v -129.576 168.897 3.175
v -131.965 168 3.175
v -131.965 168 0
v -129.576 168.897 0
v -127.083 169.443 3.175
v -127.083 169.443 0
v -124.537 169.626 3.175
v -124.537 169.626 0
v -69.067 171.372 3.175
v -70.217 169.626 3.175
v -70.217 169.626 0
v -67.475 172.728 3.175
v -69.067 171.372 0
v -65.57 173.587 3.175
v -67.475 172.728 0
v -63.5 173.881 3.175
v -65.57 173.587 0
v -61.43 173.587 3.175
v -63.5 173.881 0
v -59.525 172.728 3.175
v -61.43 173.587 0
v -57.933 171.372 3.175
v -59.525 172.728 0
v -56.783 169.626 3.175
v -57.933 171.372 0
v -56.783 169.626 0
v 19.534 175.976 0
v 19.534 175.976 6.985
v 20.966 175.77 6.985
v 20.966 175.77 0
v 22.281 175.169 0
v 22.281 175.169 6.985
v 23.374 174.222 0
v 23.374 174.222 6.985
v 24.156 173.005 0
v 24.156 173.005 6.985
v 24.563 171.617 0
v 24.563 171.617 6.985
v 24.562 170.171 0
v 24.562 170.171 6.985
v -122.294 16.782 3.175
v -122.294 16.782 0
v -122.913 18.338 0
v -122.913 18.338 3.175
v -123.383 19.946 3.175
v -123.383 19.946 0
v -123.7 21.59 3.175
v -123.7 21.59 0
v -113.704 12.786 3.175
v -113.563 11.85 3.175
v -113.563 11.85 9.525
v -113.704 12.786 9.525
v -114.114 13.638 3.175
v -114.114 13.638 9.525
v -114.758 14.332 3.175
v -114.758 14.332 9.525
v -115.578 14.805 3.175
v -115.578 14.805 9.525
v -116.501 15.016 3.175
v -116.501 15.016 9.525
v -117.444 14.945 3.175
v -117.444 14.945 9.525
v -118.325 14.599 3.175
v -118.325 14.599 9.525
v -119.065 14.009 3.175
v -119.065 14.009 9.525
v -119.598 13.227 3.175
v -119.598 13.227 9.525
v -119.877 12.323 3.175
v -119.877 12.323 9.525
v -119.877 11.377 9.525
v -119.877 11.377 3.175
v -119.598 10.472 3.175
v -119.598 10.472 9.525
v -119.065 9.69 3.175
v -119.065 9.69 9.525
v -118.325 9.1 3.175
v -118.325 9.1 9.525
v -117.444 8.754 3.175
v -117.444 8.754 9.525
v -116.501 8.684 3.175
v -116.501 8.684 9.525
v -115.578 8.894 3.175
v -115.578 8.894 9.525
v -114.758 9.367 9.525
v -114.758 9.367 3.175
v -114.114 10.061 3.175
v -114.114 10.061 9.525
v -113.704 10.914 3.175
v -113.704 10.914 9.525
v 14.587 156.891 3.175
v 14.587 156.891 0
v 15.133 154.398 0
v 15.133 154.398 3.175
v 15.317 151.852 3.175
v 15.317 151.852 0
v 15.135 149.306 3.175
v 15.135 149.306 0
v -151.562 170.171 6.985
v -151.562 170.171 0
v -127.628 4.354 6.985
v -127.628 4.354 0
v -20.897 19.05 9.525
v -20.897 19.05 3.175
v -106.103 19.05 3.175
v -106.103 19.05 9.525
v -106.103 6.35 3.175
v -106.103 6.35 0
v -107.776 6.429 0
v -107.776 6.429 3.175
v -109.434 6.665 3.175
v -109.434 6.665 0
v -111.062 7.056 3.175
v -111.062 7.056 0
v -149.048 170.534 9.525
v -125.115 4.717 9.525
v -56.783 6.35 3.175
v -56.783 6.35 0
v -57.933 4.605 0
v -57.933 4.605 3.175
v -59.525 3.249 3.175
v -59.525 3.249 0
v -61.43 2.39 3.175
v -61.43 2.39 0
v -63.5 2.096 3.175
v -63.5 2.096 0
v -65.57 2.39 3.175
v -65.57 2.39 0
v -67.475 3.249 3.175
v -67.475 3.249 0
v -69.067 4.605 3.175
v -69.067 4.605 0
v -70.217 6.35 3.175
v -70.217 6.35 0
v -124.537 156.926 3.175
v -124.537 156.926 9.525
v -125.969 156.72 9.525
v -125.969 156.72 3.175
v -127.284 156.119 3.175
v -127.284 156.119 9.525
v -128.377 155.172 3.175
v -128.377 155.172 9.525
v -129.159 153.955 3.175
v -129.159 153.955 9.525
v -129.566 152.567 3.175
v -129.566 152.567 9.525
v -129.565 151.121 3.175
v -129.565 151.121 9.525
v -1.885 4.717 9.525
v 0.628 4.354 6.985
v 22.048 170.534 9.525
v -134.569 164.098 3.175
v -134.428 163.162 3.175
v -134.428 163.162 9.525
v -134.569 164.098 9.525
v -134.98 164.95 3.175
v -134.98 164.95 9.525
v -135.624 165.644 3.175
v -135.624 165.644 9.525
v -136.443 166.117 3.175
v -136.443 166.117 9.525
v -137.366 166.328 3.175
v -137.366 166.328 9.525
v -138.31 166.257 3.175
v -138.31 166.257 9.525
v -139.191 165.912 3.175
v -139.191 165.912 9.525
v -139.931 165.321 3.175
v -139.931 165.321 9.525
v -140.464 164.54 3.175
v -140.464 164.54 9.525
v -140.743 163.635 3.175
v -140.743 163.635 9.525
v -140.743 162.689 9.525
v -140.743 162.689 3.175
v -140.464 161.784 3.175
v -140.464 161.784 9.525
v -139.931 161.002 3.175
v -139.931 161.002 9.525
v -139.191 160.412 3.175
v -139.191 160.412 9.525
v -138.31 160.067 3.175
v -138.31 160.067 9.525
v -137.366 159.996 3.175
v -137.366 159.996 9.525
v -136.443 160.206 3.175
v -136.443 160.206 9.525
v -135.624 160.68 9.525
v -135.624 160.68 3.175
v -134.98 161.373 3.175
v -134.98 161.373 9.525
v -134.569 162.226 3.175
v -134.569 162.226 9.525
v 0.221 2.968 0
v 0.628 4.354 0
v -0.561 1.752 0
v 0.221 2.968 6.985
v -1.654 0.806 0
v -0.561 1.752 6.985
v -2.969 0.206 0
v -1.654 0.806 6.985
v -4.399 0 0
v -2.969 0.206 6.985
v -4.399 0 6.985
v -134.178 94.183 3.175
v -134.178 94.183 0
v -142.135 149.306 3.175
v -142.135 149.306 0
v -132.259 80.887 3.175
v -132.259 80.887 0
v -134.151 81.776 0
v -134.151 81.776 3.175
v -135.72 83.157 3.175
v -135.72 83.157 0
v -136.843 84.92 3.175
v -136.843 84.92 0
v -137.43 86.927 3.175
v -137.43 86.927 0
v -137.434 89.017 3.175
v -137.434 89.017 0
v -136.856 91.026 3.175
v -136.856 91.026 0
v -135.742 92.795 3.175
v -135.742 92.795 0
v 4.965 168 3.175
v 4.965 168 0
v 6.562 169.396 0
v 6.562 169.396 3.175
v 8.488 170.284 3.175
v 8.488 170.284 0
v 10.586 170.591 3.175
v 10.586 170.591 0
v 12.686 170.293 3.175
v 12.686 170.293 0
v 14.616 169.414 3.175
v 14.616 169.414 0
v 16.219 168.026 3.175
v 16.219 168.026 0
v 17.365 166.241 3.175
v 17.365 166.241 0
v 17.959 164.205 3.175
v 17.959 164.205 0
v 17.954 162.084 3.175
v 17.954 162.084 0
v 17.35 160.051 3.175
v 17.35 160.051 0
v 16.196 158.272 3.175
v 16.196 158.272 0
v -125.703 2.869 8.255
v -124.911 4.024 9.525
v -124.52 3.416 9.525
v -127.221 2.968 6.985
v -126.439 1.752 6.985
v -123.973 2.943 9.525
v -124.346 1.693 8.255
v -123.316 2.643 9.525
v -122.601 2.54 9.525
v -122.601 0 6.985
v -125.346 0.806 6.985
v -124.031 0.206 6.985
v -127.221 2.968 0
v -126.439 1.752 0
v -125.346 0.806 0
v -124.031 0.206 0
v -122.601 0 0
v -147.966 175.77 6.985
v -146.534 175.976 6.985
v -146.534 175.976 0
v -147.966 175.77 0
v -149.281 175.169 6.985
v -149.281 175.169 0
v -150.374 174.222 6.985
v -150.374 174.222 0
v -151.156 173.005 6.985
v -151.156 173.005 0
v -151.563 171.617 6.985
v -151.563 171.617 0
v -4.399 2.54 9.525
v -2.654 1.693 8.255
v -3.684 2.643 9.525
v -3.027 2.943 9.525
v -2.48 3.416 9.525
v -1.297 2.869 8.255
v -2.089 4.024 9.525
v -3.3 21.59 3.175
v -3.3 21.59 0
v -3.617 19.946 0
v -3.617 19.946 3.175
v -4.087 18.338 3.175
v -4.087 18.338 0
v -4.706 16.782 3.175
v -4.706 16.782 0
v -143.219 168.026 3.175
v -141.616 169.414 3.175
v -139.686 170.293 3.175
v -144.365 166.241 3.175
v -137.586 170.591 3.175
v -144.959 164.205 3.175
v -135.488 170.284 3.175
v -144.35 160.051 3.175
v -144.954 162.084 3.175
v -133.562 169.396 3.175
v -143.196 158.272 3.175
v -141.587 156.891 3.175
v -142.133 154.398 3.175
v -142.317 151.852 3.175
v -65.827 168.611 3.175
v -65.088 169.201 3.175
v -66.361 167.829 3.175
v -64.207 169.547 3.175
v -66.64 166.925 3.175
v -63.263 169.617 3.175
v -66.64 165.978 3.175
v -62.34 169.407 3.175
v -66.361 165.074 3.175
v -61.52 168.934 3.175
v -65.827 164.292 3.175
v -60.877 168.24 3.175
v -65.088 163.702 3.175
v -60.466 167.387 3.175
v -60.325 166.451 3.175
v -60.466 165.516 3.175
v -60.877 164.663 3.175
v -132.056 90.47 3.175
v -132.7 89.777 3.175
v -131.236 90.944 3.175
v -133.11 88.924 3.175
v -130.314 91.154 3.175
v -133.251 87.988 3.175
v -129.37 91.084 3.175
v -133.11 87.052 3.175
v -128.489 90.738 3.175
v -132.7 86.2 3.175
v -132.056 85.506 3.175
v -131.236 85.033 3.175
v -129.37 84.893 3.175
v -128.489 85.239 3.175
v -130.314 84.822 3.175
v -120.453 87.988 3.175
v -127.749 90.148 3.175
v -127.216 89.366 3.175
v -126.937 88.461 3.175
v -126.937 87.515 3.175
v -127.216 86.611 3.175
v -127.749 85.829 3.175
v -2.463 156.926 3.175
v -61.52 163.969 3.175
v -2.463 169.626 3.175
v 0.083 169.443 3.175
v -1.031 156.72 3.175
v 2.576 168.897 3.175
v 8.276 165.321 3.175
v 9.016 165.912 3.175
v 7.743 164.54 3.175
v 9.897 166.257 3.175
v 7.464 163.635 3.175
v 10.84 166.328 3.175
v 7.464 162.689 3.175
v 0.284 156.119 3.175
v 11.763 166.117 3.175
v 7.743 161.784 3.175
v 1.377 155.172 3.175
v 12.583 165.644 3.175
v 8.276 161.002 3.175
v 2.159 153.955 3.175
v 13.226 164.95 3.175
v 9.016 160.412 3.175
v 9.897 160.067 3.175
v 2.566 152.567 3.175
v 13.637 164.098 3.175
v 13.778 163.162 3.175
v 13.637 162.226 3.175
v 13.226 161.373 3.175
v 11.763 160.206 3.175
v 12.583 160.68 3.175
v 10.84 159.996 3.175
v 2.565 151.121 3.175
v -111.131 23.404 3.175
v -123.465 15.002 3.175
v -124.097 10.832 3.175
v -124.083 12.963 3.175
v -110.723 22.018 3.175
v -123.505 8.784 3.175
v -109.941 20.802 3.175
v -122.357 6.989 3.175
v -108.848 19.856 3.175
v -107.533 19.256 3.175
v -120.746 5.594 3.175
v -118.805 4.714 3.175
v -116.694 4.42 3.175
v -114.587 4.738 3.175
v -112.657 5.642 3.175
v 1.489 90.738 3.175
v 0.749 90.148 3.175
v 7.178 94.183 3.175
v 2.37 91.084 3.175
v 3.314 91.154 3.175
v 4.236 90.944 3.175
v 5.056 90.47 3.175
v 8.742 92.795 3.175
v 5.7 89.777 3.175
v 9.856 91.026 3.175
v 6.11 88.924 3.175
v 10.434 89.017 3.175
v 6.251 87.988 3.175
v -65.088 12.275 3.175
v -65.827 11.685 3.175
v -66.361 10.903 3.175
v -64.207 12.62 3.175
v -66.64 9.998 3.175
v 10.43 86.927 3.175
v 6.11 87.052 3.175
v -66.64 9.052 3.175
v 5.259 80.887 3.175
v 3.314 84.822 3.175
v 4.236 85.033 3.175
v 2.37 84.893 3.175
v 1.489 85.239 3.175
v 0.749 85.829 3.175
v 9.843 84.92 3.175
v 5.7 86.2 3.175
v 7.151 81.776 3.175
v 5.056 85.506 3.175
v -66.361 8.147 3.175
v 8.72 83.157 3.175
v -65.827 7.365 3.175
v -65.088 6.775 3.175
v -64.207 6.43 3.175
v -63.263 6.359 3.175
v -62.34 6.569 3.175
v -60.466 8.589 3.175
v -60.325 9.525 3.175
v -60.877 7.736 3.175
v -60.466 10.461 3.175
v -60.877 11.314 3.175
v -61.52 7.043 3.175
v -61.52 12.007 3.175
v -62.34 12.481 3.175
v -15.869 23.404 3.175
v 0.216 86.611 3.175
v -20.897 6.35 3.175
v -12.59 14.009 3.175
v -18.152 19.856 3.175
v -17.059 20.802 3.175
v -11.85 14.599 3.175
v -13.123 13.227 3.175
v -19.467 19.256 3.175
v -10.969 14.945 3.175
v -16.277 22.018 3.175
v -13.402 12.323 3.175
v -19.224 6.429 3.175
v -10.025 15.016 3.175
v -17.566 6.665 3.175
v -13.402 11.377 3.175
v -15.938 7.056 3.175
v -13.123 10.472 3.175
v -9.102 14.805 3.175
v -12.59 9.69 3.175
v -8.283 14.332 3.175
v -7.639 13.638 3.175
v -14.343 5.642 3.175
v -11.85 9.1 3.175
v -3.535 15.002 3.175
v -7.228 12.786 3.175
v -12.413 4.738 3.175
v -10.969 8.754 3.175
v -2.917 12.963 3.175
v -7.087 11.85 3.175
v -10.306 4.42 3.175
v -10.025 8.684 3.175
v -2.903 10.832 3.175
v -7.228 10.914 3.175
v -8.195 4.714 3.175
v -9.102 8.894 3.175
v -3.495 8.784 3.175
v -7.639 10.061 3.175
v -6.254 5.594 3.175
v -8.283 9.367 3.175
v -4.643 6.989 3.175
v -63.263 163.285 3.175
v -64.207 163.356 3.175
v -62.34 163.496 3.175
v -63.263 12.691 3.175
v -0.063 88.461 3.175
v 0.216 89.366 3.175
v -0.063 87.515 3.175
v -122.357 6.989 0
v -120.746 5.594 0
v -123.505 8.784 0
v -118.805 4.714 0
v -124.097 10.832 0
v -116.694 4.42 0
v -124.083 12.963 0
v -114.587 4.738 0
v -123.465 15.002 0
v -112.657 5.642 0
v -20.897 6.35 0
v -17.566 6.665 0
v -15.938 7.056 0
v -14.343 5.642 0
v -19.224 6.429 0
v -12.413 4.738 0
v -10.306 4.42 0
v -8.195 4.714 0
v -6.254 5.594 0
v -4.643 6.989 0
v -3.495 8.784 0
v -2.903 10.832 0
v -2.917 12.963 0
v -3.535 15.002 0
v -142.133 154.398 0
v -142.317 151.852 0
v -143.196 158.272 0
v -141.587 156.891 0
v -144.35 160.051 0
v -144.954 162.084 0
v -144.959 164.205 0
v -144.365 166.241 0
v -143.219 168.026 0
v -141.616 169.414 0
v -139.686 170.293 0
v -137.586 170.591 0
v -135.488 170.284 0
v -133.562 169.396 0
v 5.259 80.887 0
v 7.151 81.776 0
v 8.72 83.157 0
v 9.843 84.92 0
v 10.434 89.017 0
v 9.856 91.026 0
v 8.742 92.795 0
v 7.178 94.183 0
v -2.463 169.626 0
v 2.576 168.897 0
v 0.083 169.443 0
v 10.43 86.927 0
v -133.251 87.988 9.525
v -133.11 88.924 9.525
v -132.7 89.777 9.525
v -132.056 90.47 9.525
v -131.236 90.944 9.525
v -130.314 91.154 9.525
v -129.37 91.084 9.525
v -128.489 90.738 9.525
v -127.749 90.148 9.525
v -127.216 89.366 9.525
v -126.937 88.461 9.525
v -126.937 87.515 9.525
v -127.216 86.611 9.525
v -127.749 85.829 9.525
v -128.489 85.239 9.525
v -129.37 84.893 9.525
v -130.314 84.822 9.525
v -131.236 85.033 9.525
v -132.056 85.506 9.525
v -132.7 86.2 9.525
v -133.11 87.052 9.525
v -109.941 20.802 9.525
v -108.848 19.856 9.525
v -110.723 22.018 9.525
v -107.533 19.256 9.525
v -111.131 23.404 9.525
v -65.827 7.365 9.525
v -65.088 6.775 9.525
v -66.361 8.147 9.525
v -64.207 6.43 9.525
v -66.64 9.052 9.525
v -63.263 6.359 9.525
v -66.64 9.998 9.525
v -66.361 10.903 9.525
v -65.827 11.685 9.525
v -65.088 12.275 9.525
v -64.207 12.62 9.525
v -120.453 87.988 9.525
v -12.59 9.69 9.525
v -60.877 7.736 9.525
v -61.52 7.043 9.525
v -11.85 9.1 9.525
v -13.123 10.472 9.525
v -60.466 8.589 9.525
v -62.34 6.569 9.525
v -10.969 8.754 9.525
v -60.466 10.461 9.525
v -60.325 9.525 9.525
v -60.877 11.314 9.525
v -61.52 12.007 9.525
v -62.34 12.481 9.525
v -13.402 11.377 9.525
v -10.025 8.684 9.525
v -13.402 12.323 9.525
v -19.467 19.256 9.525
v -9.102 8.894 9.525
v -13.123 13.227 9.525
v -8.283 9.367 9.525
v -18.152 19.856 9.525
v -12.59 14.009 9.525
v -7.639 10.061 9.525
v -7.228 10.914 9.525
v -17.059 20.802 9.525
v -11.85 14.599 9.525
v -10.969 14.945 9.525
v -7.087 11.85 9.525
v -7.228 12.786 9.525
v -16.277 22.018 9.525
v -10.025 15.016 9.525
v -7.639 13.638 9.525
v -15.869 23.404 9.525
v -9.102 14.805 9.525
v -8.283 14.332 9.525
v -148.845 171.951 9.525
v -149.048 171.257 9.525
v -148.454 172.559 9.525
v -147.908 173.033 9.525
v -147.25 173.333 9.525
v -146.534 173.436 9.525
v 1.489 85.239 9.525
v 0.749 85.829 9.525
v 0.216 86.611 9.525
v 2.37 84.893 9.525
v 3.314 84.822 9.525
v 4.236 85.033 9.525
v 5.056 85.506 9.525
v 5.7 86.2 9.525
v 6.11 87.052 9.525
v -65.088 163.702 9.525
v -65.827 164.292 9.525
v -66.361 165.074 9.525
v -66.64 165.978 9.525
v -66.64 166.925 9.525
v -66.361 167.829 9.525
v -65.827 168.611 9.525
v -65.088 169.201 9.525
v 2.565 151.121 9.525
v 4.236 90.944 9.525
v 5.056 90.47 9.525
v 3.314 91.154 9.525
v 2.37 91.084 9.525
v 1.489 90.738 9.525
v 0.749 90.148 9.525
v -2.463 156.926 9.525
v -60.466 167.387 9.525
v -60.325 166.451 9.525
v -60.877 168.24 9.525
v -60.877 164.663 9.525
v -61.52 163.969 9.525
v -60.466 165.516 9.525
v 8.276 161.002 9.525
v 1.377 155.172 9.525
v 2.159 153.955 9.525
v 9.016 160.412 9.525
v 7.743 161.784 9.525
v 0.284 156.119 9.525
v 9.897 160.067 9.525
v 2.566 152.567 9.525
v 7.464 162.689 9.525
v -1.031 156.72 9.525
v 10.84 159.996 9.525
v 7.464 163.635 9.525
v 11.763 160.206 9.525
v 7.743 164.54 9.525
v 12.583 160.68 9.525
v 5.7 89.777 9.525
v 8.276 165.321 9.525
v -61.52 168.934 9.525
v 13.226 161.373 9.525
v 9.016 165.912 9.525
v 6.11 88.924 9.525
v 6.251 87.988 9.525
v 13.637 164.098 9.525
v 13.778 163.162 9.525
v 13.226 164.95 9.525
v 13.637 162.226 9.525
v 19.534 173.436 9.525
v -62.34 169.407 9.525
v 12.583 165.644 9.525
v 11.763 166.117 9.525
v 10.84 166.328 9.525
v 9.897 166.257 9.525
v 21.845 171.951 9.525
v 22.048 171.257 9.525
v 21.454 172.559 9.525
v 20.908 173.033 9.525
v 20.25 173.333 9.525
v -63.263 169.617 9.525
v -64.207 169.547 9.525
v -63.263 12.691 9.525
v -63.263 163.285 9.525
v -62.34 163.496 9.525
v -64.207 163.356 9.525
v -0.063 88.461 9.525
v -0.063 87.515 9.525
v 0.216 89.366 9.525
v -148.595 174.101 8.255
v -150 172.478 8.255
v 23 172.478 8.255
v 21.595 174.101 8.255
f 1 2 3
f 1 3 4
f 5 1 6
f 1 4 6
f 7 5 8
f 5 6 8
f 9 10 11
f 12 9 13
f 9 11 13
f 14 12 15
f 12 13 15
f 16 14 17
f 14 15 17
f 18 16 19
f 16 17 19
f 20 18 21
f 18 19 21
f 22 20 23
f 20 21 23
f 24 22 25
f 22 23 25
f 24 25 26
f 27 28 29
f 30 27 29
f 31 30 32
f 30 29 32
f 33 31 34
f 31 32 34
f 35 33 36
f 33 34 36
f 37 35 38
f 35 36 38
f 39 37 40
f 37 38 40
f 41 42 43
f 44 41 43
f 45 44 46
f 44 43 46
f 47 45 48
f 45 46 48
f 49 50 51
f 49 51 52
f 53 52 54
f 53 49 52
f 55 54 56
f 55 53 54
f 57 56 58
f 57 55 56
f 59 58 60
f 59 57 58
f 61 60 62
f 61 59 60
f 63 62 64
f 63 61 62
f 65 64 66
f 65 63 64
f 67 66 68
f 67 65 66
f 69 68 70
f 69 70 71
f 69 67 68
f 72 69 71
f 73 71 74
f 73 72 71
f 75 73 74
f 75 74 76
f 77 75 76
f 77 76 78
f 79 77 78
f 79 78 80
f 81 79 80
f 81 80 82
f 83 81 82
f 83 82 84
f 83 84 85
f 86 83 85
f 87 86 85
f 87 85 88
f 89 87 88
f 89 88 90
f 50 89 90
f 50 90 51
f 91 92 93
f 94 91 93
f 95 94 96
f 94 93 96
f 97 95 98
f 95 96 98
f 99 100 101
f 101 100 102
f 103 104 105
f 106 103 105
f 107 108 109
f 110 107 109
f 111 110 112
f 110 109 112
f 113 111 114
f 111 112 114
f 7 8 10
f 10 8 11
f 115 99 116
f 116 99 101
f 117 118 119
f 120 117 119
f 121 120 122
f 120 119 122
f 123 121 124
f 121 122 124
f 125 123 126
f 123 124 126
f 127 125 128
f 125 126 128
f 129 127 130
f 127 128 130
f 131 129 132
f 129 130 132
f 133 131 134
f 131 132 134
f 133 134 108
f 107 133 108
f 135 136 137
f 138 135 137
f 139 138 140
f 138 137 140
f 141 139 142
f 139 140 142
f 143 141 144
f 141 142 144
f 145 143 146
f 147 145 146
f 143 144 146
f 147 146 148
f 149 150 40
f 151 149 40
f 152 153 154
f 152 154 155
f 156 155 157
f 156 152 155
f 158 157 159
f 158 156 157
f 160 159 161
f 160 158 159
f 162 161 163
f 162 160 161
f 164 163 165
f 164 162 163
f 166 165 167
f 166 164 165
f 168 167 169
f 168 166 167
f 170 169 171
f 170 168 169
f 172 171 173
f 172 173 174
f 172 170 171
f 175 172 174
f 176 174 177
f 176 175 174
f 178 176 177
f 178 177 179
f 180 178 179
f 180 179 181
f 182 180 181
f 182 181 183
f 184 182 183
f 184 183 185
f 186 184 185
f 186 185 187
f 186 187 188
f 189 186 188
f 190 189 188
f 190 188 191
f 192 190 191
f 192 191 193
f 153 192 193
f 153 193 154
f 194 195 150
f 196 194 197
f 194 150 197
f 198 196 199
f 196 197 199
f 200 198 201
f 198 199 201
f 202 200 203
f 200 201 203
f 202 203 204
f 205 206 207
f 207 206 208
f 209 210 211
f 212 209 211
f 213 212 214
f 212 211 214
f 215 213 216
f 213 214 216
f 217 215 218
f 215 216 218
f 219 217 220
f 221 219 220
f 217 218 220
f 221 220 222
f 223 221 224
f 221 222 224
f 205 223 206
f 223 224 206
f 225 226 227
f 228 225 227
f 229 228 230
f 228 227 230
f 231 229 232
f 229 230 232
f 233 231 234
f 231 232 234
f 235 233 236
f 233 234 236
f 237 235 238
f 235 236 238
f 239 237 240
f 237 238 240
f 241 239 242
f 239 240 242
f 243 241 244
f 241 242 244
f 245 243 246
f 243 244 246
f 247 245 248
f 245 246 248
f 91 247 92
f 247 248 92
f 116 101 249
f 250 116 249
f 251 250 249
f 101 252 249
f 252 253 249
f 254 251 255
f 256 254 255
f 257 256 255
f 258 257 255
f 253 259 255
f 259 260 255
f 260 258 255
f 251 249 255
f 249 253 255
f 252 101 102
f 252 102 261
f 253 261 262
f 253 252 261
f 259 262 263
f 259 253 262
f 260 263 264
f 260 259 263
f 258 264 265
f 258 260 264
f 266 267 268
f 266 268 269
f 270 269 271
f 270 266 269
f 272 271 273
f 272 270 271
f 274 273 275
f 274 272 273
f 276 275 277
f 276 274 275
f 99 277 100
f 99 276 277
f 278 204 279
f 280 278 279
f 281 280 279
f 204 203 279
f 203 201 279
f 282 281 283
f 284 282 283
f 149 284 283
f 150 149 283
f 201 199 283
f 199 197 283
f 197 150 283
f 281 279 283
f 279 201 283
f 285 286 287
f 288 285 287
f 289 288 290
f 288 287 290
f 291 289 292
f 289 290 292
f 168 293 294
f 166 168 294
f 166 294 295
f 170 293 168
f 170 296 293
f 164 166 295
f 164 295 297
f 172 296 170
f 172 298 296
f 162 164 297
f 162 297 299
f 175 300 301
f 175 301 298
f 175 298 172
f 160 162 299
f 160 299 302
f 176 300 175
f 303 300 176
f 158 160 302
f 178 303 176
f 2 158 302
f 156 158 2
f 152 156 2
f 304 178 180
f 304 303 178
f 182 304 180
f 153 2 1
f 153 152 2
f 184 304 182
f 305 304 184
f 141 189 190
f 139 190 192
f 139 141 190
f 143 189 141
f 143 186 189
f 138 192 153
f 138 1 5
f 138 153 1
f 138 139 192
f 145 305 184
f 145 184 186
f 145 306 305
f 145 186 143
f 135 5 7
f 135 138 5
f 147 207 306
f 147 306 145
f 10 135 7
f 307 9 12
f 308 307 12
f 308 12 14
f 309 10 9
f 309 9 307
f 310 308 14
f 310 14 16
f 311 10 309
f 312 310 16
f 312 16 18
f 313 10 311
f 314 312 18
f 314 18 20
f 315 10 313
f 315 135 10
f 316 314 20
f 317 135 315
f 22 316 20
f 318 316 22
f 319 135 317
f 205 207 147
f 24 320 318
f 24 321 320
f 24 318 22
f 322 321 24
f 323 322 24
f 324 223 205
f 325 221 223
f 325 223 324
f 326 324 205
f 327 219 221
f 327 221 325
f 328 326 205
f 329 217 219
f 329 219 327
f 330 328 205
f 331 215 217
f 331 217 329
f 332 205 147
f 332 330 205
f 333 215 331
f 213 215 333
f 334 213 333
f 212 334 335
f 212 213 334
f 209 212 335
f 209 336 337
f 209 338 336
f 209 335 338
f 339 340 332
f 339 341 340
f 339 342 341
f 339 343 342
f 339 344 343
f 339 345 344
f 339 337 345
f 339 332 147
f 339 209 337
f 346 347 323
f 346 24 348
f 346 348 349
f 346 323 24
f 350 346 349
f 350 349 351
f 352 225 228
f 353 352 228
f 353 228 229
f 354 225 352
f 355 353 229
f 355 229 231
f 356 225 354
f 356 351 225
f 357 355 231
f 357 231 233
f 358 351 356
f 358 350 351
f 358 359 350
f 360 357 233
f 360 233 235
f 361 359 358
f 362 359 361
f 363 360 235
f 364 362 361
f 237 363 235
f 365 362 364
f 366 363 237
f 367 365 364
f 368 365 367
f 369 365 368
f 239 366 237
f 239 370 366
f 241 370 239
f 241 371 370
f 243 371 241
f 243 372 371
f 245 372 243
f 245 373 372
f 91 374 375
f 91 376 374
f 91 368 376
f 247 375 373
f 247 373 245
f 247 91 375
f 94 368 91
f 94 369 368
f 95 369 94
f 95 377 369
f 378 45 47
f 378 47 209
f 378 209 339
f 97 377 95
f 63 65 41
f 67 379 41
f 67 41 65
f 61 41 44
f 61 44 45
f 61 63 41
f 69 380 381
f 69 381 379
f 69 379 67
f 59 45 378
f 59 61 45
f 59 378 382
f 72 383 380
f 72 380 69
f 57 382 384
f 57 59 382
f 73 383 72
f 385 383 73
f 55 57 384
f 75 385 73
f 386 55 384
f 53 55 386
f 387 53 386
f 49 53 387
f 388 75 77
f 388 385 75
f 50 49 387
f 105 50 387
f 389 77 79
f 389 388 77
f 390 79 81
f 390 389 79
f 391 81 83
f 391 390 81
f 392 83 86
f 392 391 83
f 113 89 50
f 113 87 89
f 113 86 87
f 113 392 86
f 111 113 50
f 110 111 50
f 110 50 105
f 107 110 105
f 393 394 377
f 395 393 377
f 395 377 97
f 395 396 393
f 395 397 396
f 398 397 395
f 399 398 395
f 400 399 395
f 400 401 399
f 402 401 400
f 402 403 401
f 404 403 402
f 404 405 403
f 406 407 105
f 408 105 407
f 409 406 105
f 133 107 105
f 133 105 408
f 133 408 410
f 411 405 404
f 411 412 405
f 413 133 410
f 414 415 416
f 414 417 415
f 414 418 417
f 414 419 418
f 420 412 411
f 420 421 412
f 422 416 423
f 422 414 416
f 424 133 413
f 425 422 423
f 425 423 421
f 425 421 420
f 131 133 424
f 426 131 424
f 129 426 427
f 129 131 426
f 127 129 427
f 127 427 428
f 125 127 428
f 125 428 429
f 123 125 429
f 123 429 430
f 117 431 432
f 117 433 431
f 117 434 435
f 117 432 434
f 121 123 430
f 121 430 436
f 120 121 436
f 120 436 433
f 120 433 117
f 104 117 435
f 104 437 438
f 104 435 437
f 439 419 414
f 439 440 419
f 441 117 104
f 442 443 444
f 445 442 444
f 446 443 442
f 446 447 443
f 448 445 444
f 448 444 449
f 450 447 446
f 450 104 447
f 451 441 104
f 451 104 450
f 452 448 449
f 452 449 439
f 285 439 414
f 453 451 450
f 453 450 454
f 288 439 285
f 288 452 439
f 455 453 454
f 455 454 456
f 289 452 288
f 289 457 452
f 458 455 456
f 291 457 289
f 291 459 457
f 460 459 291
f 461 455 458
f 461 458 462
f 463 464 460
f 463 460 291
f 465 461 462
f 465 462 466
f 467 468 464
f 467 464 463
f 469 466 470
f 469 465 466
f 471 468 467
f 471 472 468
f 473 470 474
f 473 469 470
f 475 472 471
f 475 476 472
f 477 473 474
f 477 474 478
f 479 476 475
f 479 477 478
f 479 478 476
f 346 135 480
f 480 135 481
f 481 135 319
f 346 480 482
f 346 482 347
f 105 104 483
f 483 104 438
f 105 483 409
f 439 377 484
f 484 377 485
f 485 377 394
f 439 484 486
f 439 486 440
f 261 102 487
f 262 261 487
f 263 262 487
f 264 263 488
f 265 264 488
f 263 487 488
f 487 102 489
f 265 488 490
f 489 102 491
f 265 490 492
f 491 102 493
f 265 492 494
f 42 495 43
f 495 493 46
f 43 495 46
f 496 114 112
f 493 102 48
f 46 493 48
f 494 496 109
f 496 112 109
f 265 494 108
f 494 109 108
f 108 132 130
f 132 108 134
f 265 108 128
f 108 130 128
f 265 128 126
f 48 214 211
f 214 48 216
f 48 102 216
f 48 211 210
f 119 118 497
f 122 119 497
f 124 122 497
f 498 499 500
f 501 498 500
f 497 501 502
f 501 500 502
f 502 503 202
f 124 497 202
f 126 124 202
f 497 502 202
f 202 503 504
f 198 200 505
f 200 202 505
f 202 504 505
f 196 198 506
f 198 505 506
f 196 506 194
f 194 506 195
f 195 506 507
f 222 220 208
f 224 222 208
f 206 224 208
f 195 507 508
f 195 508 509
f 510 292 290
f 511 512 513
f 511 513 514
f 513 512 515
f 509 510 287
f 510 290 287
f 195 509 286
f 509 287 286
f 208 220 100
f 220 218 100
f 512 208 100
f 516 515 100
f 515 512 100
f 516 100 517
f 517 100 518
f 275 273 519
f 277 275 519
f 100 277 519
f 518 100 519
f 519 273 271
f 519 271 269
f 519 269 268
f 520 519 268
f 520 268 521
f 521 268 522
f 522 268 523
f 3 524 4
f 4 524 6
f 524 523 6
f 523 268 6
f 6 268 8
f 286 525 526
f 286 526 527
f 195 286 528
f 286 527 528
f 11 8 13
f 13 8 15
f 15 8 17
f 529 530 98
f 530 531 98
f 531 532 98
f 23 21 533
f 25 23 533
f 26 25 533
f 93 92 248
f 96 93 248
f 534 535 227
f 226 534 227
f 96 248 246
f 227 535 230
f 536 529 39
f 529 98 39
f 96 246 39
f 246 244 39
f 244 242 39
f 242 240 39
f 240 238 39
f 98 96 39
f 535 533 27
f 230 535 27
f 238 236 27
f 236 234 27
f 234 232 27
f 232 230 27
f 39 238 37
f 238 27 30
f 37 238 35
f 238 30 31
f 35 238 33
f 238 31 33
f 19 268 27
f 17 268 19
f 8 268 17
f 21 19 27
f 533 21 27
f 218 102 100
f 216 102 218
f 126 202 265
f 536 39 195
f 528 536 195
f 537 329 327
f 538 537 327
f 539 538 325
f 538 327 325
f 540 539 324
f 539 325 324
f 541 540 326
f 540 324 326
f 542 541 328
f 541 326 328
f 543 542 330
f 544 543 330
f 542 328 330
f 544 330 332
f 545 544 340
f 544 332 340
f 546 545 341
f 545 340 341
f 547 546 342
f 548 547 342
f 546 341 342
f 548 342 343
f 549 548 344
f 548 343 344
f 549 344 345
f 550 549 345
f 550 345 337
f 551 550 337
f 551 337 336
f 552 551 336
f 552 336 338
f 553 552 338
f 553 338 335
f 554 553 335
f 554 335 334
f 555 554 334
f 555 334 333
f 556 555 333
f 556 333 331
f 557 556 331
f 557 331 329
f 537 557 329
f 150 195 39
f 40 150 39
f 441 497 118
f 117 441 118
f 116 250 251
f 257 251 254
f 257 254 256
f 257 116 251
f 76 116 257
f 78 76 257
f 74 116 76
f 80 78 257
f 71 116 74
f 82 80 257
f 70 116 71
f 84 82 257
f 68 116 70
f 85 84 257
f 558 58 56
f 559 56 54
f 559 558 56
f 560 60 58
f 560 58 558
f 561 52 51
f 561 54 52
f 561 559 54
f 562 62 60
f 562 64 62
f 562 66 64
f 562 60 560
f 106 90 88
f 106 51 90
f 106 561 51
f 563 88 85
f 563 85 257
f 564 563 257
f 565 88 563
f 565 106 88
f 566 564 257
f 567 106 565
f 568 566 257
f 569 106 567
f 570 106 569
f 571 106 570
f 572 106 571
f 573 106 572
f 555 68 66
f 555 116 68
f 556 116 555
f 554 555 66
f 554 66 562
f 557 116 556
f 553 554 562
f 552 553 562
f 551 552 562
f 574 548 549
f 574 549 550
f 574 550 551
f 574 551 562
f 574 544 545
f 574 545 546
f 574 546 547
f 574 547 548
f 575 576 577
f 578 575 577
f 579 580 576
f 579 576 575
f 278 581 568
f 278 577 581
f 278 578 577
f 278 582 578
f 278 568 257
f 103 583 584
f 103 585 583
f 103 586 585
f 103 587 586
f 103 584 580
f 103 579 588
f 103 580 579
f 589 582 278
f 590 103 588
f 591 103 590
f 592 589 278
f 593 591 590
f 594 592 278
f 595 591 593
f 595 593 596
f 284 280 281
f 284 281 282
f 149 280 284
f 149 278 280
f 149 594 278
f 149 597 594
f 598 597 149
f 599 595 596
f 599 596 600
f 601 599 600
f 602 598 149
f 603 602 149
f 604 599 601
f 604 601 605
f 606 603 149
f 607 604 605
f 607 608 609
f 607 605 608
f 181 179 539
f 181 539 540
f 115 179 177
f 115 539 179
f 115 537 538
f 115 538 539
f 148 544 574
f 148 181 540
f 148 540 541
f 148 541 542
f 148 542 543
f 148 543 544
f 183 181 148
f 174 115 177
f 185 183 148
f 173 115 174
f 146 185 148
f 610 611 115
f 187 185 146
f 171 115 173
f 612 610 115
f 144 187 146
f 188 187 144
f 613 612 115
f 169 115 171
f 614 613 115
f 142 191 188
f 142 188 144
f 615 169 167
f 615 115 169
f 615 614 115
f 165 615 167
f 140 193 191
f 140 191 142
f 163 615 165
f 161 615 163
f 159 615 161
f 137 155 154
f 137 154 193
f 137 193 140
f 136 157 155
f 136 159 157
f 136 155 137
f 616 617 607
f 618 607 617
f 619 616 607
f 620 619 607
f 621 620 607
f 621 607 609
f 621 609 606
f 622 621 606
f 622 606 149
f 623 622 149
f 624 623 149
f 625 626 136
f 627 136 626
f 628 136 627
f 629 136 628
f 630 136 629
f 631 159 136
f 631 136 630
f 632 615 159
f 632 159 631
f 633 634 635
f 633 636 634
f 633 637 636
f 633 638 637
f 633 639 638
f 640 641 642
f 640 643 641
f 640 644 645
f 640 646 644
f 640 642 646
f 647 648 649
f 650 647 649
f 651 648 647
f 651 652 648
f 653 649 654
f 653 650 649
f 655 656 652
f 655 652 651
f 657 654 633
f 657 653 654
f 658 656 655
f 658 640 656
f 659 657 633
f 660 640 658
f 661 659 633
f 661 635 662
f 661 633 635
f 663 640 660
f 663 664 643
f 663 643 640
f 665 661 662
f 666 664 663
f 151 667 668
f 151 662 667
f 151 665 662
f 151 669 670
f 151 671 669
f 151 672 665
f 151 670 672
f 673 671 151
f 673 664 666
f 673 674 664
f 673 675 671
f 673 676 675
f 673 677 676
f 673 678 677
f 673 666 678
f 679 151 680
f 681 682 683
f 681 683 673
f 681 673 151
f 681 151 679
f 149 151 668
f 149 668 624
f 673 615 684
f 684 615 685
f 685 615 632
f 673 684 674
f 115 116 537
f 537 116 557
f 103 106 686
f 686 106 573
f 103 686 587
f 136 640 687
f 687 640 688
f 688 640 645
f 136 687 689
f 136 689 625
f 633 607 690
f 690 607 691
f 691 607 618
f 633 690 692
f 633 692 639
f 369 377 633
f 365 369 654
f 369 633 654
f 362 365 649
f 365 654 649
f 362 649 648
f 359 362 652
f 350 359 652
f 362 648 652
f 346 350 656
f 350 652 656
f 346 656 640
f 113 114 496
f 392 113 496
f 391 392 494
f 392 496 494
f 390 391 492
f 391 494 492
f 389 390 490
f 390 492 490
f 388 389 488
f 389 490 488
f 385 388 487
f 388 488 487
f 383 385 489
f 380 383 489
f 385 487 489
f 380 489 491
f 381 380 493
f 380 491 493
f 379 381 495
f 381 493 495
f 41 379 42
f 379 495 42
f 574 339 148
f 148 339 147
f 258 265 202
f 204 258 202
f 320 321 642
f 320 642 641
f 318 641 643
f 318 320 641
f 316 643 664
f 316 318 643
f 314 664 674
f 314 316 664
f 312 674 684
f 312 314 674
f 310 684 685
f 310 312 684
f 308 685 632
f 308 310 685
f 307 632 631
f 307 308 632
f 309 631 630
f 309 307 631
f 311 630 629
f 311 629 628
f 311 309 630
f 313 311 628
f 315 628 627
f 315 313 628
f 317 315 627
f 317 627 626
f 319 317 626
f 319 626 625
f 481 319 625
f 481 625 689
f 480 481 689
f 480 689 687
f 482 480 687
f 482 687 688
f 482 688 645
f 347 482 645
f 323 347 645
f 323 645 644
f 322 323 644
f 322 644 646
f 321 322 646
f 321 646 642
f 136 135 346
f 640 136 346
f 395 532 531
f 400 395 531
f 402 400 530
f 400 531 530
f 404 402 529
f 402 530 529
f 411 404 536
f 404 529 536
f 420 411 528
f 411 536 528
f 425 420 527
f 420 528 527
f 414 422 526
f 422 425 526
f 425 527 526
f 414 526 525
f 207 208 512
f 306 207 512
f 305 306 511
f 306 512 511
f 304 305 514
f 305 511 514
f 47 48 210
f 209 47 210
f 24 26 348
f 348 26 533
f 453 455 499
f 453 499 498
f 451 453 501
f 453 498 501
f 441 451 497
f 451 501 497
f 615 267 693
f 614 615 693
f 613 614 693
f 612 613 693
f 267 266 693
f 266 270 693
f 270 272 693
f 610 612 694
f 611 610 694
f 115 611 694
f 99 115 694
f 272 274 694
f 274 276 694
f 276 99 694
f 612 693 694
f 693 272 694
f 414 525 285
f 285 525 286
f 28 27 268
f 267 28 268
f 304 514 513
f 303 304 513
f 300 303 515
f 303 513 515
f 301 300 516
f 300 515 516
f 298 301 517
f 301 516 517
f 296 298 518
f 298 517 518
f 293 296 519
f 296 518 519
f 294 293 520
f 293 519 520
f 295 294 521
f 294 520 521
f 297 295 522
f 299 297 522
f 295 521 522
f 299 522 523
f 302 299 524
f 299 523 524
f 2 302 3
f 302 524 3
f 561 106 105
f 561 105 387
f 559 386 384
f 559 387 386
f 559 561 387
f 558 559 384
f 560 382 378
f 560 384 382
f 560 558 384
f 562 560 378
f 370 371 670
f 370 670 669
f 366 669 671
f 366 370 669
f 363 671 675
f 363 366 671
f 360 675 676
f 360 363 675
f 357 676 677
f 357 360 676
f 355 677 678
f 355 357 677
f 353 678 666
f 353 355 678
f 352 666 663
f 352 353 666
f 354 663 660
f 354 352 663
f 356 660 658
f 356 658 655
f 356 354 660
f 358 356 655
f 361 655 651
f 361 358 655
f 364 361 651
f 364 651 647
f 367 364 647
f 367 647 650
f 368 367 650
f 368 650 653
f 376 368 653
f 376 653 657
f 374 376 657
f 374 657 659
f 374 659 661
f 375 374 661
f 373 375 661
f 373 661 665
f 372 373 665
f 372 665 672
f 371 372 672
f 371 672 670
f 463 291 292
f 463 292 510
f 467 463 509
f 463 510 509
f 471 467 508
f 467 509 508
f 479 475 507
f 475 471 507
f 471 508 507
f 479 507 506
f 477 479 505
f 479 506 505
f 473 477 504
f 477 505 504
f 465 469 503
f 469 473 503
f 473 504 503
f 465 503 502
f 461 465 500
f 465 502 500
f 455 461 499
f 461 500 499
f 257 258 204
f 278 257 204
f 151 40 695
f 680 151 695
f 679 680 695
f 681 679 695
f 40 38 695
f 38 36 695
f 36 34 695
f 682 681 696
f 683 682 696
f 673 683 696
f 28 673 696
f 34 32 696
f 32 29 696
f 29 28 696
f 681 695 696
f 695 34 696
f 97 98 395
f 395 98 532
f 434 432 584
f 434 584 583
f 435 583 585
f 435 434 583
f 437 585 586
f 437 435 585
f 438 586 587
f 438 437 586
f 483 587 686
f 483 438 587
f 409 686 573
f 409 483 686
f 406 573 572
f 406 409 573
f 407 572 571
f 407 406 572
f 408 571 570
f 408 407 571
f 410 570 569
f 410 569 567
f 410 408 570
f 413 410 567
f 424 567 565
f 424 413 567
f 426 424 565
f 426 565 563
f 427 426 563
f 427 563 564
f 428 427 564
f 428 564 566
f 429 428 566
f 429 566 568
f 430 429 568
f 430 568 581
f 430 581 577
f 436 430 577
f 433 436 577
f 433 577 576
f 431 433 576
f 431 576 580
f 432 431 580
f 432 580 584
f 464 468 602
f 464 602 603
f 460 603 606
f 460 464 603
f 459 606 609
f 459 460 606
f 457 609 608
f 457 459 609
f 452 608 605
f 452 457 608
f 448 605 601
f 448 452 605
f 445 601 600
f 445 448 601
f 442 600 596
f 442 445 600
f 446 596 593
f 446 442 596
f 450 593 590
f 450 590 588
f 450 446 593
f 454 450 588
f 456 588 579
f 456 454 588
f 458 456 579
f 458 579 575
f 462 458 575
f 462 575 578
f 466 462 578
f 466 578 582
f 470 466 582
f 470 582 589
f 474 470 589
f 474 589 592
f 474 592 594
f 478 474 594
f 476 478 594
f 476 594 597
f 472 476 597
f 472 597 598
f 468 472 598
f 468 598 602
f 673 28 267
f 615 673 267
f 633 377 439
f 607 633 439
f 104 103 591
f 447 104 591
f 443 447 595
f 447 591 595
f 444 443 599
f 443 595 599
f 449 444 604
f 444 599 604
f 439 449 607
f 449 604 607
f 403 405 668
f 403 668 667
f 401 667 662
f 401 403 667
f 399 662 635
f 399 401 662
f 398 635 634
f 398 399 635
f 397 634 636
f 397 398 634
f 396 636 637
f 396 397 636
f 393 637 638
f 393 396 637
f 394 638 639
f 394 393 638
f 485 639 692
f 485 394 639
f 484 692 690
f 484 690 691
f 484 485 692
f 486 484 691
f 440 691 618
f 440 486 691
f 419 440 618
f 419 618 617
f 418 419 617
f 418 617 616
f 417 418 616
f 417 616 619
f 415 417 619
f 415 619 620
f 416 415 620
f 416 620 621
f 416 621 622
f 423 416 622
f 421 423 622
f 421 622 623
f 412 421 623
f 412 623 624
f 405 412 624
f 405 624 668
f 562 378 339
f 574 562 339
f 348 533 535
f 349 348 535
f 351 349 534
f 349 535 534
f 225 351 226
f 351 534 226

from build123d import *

# Parameters (mm, degrees)
F0_R     = 3.175
F1_DEPTH = 9.525
F2_R     = 5.08
F3_SIZE  = 2.54
F5_DEPTH = 3.175
F6_R     = 7.4295
F7_DEPTH = 3.175


with BuildPart() as f1:
    # F0 (on Top) → F1 (new body)
    with BuildSketch(Plane.XY):
        Polygon((25.4, 175.976362), (-152.4, 175.976362), (-139.7, 87.988181), (-127, 0), (0, 0), align=None)
        with Locations((-116.737792, 11.849777)):
            Circle(F0_R, mode=Mode.SUBTRACT)
        with BuildLine():
            ThreePointArc((-126.901293, 87.988181), (-130.076293, 84.813181), (-133.251293, 87.988181))
            ThreePointArc((-133.251293, 87.988181), (-130.076293, 91.163181), (-126.901293, 87.988181))
        make_face(mode=Mode.SUBTRACT)
        with Locations((-63.5, 9.525)):
            Circle(F0_R, mode=Mode.SUBTRACT)
        with Locations((-10.262208, 11.849777)):
            Circle(F0_R, mode=Mode.SUBTRACT)
        with Locations((3.076293, 87.988181)):
            Circle(F0_R, mode=Mode.SUBTRACT)
        with Locations((-137.603178, 163.161938)):
            Circle(F0_R, mode=Mode.SUBTRACT)
        Polygon((-110.502216, 19.05), (-120.452585, 87.988181), (-130.402955, 156.926362), (3.402955, 156.926362), (-16.497784, 19.05), align=None, mode=Mode.SUBTRACT)
        with Locations((-63.5, 166.451362)):
            Circle(F0_R, mode=Mode.SUBTRACT)
        with Locations((10.603178, 163.161938)):
            Circle(F0_R, mode=Mode.SUBTRACT)
    extrude(amount=F1_DEPTH)

    # F2
    f2_edges = [f1.edges().sort_by_distance(p)[0] for p in [
        (-152.4, 175.976362, 4.7625),
        (-130.402955, 156.926362, 4.7625),
        (25.4, 175.976362, 4.7625),
        (3.402955, 156.926362, 4.7625),
        (-127, 0, 4.7625),
        (0, 0, 4.7625),
        (-16.497784, 19.05, 4.7625),
        (-110.502216, 19.05, 4.7625),
    ]]
    fillet(f2_edges, radius=F2_R)

    # F3
    f3_edges = [f1.edges().sort_by_distance(p)[0] for p in [
        (-63.5, 0, 9.525),
    ]]
    chamfer(f3_edges, length=F3_SIZE)

    # F4 (on face) → F5 (cut)
    with BuildSketch(Plane(origin=(0, 0, 0), x_dir=(1, 0, 0), z_dir=(0, 0, -1))):
        with BuildLine():
            ThreePointArc((-3.299557, -21.59), (-9.257451, -10.689583), (-20.897193, -6.35))
            Line((-20.897193, -6.35), (-106.102807, -6.35))
            ThreePointArc((-106.102807, -6.35), (-117.742549, -10.689583), (-123.700443, -21.59))
            Line((-123.700443, -21.59), (-142.134712, -149.306362))
            ThreePointArc((-142.134712, -149.306362), (-137.977493, -163.486104), (-124.537076, -169.626362))
            Line((-124.537076, -169.626362), (-2.462924, -169.626362))
            ThreePointArc((-2.462924, -169.626362), (10.977493, -163.486104), (15.134712, -149.306362))
            Line((15.134712, -149.306362), (-3.299557, -21.59))
        make_face()
    extrude(amount=-F5_DEPTH, mode=Mode.SUBTRACT)

    # F6 (on face) → F7 (cut, through all)
    with BuildSketch(Plane(origin=(0, 0, 0), x_dir=(1, 0, 0), z_dir=(0, 0, -1))):
        with Locations((-116.737792, -11.849777)):
            Circle(F6_R)
        with Locations((-63.5, -9.525)):
            Circle(F6_R)
        with Locations((-10.262208, -11.849777)):
            Circle(F6_R)
        with Locations((3.076293, -87.988181)):
            Circle(F6_R)
        with Locations((-63.5, -166.451362)):
            Circle(F6_R)
        with Locations((-137.603178, -163.161938)):
            Circle(F6_R)
        with Locations((10.603178, -163.161938)):
            Circle(F6_R)
        with Locations((-130.076293, -87.988181)):
            Circle(F6_R)
    extrude(amount=-F7_DEPTH, mode=Mode.SUBTRACT)


solid = f1.part
